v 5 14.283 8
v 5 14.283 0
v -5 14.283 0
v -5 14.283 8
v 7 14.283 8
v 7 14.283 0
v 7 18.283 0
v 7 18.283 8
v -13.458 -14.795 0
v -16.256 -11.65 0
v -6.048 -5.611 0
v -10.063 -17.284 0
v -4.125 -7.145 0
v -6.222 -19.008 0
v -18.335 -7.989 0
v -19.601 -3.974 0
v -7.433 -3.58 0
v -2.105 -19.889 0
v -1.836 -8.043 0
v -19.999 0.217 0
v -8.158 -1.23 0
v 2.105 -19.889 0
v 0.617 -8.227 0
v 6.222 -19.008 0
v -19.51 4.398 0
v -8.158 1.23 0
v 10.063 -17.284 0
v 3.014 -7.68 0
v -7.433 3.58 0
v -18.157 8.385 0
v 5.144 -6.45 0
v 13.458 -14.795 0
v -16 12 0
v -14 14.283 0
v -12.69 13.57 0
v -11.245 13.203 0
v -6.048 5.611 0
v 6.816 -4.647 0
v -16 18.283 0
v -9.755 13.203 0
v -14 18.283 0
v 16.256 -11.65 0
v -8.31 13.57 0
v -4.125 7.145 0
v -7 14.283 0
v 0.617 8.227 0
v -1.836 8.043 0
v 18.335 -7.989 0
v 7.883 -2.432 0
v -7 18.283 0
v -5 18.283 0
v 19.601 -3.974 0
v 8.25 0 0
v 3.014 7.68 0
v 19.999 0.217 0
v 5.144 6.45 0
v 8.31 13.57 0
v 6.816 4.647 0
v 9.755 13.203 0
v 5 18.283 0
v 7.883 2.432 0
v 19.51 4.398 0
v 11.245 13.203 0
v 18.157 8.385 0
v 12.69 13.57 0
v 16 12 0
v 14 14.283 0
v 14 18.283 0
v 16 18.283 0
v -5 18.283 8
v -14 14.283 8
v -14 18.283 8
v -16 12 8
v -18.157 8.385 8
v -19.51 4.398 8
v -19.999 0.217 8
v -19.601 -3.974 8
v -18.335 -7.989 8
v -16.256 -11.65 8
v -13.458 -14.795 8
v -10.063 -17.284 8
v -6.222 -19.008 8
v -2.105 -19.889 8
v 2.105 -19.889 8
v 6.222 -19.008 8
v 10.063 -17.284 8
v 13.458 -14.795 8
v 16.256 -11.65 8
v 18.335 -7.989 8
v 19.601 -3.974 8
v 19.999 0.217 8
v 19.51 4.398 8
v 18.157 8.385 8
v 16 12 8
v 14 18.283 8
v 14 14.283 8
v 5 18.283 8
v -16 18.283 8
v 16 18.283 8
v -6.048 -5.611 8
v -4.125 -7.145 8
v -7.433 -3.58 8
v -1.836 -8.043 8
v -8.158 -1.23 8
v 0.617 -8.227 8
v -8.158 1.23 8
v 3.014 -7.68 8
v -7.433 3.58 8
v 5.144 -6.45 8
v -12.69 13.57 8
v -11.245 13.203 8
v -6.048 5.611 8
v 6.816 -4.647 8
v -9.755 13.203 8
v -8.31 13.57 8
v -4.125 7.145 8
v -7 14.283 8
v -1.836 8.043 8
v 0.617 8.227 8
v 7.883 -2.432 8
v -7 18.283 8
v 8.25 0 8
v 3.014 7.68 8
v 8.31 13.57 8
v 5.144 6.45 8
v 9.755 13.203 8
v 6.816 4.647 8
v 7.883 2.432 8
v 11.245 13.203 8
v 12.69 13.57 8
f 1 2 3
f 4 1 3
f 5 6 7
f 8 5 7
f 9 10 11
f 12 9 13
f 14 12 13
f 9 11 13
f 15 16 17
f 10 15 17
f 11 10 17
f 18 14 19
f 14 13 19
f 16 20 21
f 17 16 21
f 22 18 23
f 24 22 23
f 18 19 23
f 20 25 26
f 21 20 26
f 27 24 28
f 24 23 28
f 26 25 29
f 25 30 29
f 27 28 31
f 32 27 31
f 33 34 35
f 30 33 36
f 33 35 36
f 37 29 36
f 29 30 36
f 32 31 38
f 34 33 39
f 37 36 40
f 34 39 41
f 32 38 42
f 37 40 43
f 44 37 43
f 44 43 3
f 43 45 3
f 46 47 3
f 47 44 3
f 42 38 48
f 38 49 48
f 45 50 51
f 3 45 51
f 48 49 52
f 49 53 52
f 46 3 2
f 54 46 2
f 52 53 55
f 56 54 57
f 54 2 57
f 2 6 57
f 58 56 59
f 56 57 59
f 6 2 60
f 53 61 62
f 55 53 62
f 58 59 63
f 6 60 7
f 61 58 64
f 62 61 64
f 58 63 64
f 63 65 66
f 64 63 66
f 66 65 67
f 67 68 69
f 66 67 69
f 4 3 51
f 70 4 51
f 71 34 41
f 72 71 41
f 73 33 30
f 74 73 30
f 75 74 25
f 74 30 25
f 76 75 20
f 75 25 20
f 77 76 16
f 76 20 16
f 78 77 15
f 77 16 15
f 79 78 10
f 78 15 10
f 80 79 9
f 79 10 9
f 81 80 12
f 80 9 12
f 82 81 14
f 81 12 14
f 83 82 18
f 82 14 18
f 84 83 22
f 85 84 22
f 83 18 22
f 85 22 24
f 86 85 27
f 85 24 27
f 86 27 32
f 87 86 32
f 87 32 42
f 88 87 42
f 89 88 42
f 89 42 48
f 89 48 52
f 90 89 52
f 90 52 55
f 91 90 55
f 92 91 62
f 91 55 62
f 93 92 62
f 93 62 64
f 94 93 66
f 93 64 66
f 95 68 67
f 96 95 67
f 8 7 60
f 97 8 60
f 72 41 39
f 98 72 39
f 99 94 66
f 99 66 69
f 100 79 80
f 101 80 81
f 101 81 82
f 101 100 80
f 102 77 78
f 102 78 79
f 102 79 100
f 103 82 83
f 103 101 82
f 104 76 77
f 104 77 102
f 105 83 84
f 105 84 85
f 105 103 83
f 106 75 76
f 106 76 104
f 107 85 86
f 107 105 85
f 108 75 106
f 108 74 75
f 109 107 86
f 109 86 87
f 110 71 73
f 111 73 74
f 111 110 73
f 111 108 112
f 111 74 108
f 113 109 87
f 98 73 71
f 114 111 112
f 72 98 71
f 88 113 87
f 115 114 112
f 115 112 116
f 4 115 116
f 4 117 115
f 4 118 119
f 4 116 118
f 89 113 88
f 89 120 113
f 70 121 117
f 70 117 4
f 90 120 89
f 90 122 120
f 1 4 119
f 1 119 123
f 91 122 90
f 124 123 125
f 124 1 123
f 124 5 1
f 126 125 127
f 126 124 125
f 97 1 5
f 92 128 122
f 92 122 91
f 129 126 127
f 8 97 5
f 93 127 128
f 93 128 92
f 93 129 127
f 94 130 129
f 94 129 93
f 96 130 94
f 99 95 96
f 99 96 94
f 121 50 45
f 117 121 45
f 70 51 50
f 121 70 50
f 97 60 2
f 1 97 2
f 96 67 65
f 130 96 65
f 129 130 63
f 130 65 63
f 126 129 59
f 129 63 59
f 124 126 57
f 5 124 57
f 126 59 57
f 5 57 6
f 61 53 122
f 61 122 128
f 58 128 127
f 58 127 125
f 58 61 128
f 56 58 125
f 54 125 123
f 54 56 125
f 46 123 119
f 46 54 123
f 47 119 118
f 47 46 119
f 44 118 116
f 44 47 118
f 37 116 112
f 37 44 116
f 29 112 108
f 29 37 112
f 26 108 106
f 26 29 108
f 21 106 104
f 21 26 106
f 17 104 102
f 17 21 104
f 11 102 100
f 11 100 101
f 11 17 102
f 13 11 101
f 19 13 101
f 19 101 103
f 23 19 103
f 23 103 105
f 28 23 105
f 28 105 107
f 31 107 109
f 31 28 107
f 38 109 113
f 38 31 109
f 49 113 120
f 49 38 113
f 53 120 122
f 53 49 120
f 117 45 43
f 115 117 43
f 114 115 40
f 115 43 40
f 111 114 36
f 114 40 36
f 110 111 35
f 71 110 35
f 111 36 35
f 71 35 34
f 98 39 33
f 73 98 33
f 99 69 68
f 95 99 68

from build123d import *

# Parameters (mm, degrees)
F0_R     = 8.25
F1_DEPTH = 8


with BuildPart() as f1:
    # F0 (on Top) → F1 (new body)
    with BuildSketch(Plane.XY):
        with BuildLine():
            Line((-16, 18.282857), (-16, 12))
            ThreePointArc((-16, 12), (0, -20), (16, 12))
            Line((16, 12), (16, 18.282857))
            Line((16, 18.282857), (14, 18.282857))
            Line((14, 18.282857), (14, 14.282857))
            ThreePointArc((14, 14.282857), (10.5, 13.156254), (7, 14.282857))
            Line((7, 14.282857), (7, 18.282857))
            Line((7, 18.282857), (5, 18.282857))
            Line((5, 18.282857), (5, 14.282857))
            Line((5, 14.282857), (0, 14.282857))
            Line((0, 14.282857), (-5, 14.282857))
            Line((-5, 14.282857), (-5, 18.282857))
            Line((-5, 18.282857), (-7, 18.282857))
            Line((-7, 18.282857), (-7, 14.282857))
            ThreePointArc((-7, 14.282857), (-10.5, 13.156254), (-14, 14.282857))
            Line((-14, 14.282857), (-14, 18.282857))
            Line((-14, 18.282857), (-16, 18.282857))
        make_face()
        Circle(F0_R, mode=Mode.SUBTRACT)
    extrude(amount=F1_DEPTH)


solid = f1.part
